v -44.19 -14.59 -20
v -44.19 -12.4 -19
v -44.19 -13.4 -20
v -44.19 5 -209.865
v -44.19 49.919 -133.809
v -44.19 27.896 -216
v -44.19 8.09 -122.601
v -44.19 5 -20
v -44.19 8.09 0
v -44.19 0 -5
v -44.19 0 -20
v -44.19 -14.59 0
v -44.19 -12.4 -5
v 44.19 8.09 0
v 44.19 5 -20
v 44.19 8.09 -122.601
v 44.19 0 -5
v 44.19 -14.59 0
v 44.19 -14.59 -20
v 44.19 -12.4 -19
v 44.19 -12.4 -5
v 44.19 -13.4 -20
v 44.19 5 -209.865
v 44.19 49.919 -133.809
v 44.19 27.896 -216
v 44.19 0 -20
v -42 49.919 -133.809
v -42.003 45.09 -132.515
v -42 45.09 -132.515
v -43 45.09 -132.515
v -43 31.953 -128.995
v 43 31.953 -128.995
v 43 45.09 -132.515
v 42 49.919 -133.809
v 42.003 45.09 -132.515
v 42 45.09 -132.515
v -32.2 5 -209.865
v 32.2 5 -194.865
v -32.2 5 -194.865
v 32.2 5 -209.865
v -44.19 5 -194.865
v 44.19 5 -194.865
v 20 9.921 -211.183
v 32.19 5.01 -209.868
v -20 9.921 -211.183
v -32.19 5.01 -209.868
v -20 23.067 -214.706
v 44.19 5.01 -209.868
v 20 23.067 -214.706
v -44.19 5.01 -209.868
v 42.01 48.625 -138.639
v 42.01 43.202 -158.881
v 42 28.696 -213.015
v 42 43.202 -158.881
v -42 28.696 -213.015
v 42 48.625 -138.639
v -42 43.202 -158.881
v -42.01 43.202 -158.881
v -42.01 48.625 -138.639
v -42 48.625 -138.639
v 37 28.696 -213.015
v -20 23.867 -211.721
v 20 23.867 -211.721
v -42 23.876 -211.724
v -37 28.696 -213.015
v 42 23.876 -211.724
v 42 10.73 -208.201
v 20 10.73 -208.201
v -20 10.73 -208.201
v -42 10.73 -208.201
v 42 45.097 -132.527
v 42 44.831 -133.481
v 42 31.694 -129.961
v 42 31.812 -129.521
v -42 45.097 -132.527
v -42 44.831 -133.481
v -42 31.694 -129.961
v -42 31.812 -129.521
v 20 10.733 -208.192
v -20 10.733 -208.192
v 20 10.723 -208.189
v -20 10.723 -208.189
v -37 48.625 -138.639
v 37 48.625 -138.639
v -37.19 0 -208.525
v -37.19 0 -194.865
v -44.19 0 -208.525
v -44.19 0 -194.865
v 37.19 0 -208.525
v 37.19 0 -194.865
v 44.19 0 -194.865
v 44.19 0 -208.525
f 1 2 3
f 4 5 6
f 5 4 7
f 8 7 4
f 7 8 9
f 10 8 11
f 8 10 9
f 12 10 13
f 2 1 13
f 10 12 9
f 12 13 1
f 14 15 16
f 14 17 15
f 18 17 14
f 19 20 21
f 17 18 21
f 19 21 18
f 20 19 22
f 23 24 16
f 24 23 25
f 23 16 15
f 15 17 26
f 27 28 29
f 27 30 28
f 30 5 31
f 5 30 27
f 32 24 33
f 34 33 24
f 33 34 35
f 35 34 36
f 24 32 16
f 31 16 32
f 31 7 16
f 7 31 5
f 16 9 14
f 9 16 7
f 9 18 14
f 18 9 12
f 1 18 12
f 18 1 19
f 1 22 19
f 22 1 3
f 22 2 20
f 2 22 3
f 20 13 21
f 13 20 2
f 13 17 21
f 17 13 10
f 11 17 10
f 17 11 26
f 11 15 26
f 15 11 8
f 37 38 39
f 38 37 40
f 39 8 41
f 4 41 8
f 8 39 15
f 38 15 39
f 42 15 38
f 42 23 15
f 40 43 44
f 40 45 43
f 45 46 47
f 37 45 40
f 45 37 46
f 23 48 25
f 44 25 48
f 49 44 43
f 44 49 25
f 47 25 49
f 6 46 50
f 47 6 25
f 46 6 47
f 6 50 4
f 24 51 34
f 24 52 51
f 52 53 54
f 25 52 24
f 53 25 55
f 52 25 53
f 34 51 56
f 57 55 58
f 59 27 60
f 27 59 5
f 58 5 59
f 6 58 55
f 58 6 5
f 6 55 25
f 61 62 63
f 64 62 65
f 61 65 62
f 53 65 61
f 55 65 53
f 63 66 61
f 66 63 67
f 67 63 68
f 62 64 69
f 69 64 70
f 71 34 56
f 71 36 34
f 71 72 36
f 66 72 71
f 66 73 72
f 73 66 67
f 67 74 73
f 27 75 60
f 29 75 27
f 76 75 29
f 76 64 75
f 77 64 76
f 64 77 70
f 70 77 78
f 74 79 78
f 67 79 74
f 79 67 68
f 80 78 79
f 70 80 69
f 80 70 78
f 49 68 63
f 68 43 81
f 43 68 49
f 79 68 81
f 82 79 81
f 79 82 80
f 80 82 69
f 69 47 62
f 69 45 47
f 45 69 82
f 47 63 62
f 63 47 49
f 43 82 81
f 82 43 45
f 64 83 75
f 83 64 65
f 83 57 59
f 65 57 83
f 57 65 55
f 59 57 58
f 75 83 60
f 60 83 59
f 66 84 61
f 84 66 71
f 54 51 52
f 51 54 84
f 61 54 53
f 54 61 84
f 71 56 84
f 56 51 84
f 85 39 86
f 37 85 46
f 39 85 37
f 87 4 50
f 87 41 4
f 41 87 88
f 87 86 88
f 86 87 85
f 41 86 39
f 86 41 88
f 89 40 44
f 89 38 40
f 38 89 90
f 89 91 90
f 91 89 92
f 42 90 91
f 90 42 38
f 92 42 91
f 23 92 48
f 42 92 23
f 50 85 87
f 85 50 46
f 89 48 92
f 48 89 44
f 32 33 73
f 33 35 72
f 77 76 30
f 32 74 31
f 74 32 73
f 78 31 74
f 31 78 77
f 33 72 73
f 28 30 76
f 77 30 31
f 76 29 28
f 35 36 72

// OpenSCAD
// file: BOSL2/std.scad
// Minimal BOSL2 compatibility shim for bundled gallery models.
// It implements only the helpers used by the imported OpenSCAD projects.

CENTER = [0, 0, 0];
BOTTOM = [0, 0, -1];
TOP = [0, 0, 1];
LEFT = [-1, 0, 0];
RIGHT = [1, 0, 0];
FRONT = [0, -1, 0];
BACK = [0, 1, 0];

module up(z=0) {
    translate([0, 0, z]) children();
}

module down(z=0) {
    translate([0, 0, -z]) children();
}

module attach(anchor=CENTER) {
    children();
}

module cuboid(size=[1, 1, 1], anchor=CENTER) {
    center = anchor == CENTER;
    translate(center ? [0, 0, 0] : [0, 0, size[2] / 2])
        cube(size, center=true);
    children();
}

module xcyl(h=1, r=1, anchor=CENTER) {
    center = anchor == CENTER;
    translate(center ? [0, 0, 0] : [h / 2, 0, 0])
        rotate([0, 90, 0])
            cylinder(h=h, r=r, center=true);
}
// main file
// phone-shower-holder.scad
//
// One piece. Hangs on the front face of a half-inch glass shower panel by a
// hook over the panel's top edge, and holds a phone by the two long edges of
// its bottom half, leaning the top of the phone out toward the viewer.
//
// Second design. The first was a full-length tray rebuilt from a SketchUp-era
// mesh: it stood the phone flat against the glass in a pocket with nothing in
// front to keep it there, and Ziad scrapped it on 2026-09-20 for this. Nothing
// here is measured off that mesh. Every number is authored, and the hook's are
// the ones the first design settled on.
//
// FRAME. Authored hung, the way it is used:
//
//     x  ->  across the panel, centered
//     y  ->  out from the glass toward the viewer. The glass's front face is
//            y = 0 and the glass itself is y < 0, so the hook's leg is the
//            only thing at negative y. Only the channel wall at the top and
//            the two feet at the bottom touch y = 0; the spine between them
//            stands `standoff` off the glass so water behind it runs out.
//     z  ->  up, with z = 0 at the top of the cap. Everything hangs below.
//
// The cradle is authored in its own frame, tilted `tilt` degrees about x, and
// placed with in_cradle(): x is shared, y' is out from the backrest (normal to
// the phone), z' runs up the phone's long axis from the ledge. Every cradle
// dimension is in that frame, so "front" means the phone's screen side and
// "top" means toward the phone's top, whatever those come to in hung z.
//
// PRINTING. On a side, one rail down; `orient = "print"` writes the STL that
// way, yawed 45 degrees so 216 mm fits the plate's diagonal inside the safe
// envelope. Every face is then vertical except the upper rail's 45 degree lip,
// the upper foot's 45 degree inner face, the top-end chamfers, and the ledge
// over the notch, which bridges 13.6 mm from the backrest to the front bar. No support. Standing it on the hook end,
// as the first design planned, is worse: the face the phone stands on would be
// an overhang 15 degrees off horizontal, and the part is over the 215 mm safe
// height that way.

include <BOSL2/std.scad>

/* [Which output] */
// "fitcheck" adds the glass in the hook and the phone in the cradle. Not for
// printing - it is the view that proves the tilt and the clearances.
show   = "part";  // [part, fitcheck]
// "print" lies the part on its -x side, yawed 45 degrees, so it lands on the
// plate the way it should be sliced. Same geometry.
orient = "hung";  // [hung, print]

/* [Phone] */
// A 16 Pro Max in its case, as Ziad measured it on 2026-09-20, "about".
// CALIPER BOTH BEFORE PRINTING: the rails are cut to these plus the slack
// below, and a case 1 mm wider than "about" will not go in.
phone_w = 83.0;   // width, in its case (mm)
phone_t = 13.0;   // thickness, in its case (mm)
phone_l = 166.0;  // length, in its case; fitcheck only (mm)
// Free clearance on a 0.4 nozzle is 0.30 per the ladder in
// docs/flashforge-ad5m-pro-scad-reference.md; opened because the phone goes in
// and out wet, one-handed.
phone_fit_w = 1.0;  // total slack across the width (mm)
phone_fit_t = 0.6;  // slack between the backrest and the root of the lips (mm)

/* [Hang] */
tilt        = 15;     // deg; the top of the phone leans out toward the viewer
overall_len = 216.0;  // top of the cap to the lowest point of the cradle (mm)

/* [Hook - over the glass] */
glass_t   = 12.0;  // panel thickness, calipered 2026-09-20 (mm)
glass_fit = 0.40;  // total slack across the channel; it goes on and off wet (mm)
// Both faces exposed, so the rungs are 0.84, 1.29, 1.74, 2.19, 2.64, 3.09.
leg_t     = 2.19;  // the leg that drops behind the glass (mm)
cap_t     = 5.0;   // material over the glass's top edge (mm)
wrap      = 15.0;  // how far the leg reaches down the back face (mm)
// 45 deg, eating into the leg; held to 1.0 so the flat left on the leg's end
// stays over the 0.84 floor for a load-bearing feature.
lead_in   = 1.0;   // guide at the channel's mouth (mm)

/* [Spine] */
// The plate down the glass from the hook to the cradle. It carries the
// cradle's whole moment.
spine_t = 3.09;  // (mm)
// The spine does not lie on the glass. It bears at the top through the
// channel's front wall and at the bottom through two feet, and between them
// it stands off by this much, so the gap behind it is open along both sides
// and across the bottom and water runs out instead of sitting there. The
// first design lay flat on the glass and drained through slots, which was
// not enough.
standoff = 5.0;   // spine's back face to the glass (mm)
foot_w   = 12.0;  // each foot, in from the part's side face (mm)
foot_h   = 15.0;  // each foot, up from the bottom (mm)

/* [Cradle] */
cradle_len = 82.0;  // how much of the phone's edge is held, up from its bottom (mm)
wall       = 2.19;  // the rail walls, outside the phone's edges (mm)
// The lip is a 45 degree bevel, not a flat tab, so that it prints with the
// part on its side: the upper rail's lip hangs from its wall and 45 is the
// steepest it can hang. Its reach is measured at the front face; at the level
// of the phone's own face the bevel is just leaving the wall.
lip_r      = 5.0;   // reach of each lip, inward from its wall (mm)
ledge_t    = 3.09;  // the shelf the phone's bottom edge stands on (mm)
back_min   = 2.64;  // backrest thickness at the ledge, where the wedge is thinnest (mm)
notch_w    = 40.0;  // gap in the ledge for the lanyard, centered (mm)
// Chamfer on the rails' inner edges at the top end, where the phone goes in.
// Small, because the walls are only 2.19.
flare      = 1.0;   // (mm)

/* [Quality] */
$fn = 64;  // nothing here is round, but the template wants it set

// Small overshoot used on every subtracted solid so its faces are never
// coplanar with the parent's.
eps = 0.01;

// Long enough to pass through anything here.
tall = 300;

// ---------------------------------------------------------------- derived

gch   = glass_t + glass_fit;          // the channel the glass sits in
ch_w  = phone_w + phone_fit_w;        // between the rail walls
W     = ch_w + 2 * wall;              // the part's width
h_ch  = phone_t + phone_fit_t;        // backrest to the root of the lips
front = h_ch + lip_r;                 // backrest to the cradle's front face

s = sin(tilt);
c = cos(tilt);

// Cradle origin: the phone's bottom-back corner. In front of the spine by the
// thinnest the backrest gets, and as far down as puts the lowest point of the
// cradle - the front-bottom corner of the ledge - at overall_len.
spine_back  = standoff;
spine_front = standoff + spine_t;
y0 = spine_front + back_min;
z0 = -overall_len + front * s + ledge_t * c;

// Cradle frame to hung frame. Same map as in_cradle().
function H(yp, zp) = [y0 + yp * c + zp * s, z0 - yp * s + zp * c];

// Where the cradle's top plane runs back into the spine's front face, and
// where its bottom plane runs back to the spine's back face.
yp_top = (spine_front - y0 - cradle_len * s) / c;
yp_bot = (spine_back - y0 + ledge_t * s) / c;
z_foot = H(yp_bot, -ledge_t).y;  // the lowest point of the spine's back face

y_min = -(gch + leg_t);
y_max = H(front, cradle_len).x;

module in_cradle() {
    translate([0, y0, z0])
        rotate([-tilt, 0, 0])
            children();
}

// ---------------------------------------------------------------- body

// The whole side silhouette - hook, spine, wedge, and the cradle's box - as
// one polygon in (y, z). Everything that is not full width is cut out of the
// sweep of this or added to it afterward. Top level rather than inside body()
// because oriented() reads it too, to center the print pose on the plate.
silhouette = [
    [y_min,       0],                    // leg outer face, top
    [spine_front, 0],                    // cap front, top
    H(yp_top, cradle_len),               // the wedge's top meets the spine
    H(front,  cradle_len),               // cradle front, top
    H(front, -ledge_t),                  // cradle front, bottom: the lowest point
    H(yp_bot, -ledge_t),                 // the bottom runs back to the spine
    [spine_back, -cap_t - wrap],         // up the spine's back face, standing off
    [0,          -cap_t - wrap],         // out to the glass: the channel wall's foot
    [0,    -cap_t],                      // up the glass face to the cap
    [-gch, -cap_t],                      // across the channel's closed end
    [-gch, -cap_t - wrap + lead_in],     // down the leg's inner face
    [-gch - lead_in, -cap_t - wrap],     // the lead-in
    [y_min, -cap_t - wrap],              // leg outer face, bottom
];

module body() {
    rotate([90, 0, 90])
        linear_extrude(height = W, center = true, convexity = 6)
            polygon(silhouette);
}

// What the phone sits in: open at the front and at the top, floored by the
// ledge, backed by the wedge.
module pocket() {
    in_cradle()
        translate([-ch_w / 2, 0, 0])
            cube([ch_w, tall, tall]);
}

// Through the ledge, from the backrest forward to the phone's face, so the
// lanyard can hang straight down out of the case. It stops short of the
// front bar under the lips, which is what the ledge bridges from when the
// part prints on its side.
module notch() {
    in_cradle()
        translate([-notch_w / 2, -eps, -ledge_t - eps])
            cube([notch_w, h_ch + eps, ledge_t + 2 * eps]);
}

// One 45 degree bevel per rail, root on the wall, running the length of the
// cradle, with its top end cut back at 45 degrees so a phone coming down from
// above is steered in behind it rather than stopped on it.
module lips() {
    for (side = [-1, 1])
        in_cradle()
            difference() {
                linear_extrude(height = cradle_len)
                    polygon([
                        [side * (ch_w / 2 + eps), h_ch],
                        [side * (ch_w / 2 + eps), front],
                        [side * (ch_w / 2 - lip_r), front],
                    ]);

                translate([0, h_ch, cradle_len])
                    rotate([-45, 0, 0])
                        translate([-W, 0, 0])
                            cube([2 * W, tall, tall]);
            }
}

// Chamfer on the walls' inner edges at the top end. Confined to the depth
// behind the lips so it never undercuts a lip's root.
module flare_cut() {
    in_cradle()
        hull() {
            translate([-ch_w / 2, 0, cradle_len - flare])
                cube([ch_w, h_ch, eps]);

            translate([-ch_w / 2 - flare, 0, cradle_len])
                cube([ch_w + 2 * flare, h_ch, tall]);
        }
}

// Two feet at the bottom corners of the spine's back face, out to the glass.
// The inner face of each is a 45 degree slope, because in the print pose the
// upper foot hangs off the spine with nothing under it. Trimmed to the same
// plane as the rest of the bottom.
module feet() {
    intersection() {
        for (side = [-1, 1])
            translate([0, 0, z_foot - standoff])
                linear_extrude(height = foot_h + standoff)
                    polygon([
                        [side * W / 2, 0],
                        [side * W / 2, spine_back + eps],
                        [side * (W / 2 - foot_w), spine_back + eps],
                        [side * (W / 2 - foot_w + standoff), 0],
                    ]);

        in_cradle()
            translate([-W, -tall, -ledge_t])
                cube([2 * W, 2 * tall, tall]);
    }
}

module phone_holder() {
    difference() {
        union() {
            difference() {
                body();
                pocket();
                notch();
            }

            lips();
            feet();
        }

        flare_cut();
    }
}

// ---------------------------------------------------------------- output

// Hung, or lying on its -x side yawed 45 degrees. The yaw is what fits 216 mm
// inside the 205 mm safe envelope, and the part is centered after it: the
// silhouette is no rectangle, so the centre of the yawed footprint is not the
// centre of the hung one.
print_yaw = 45;
// Each silhouette vertex after the lay-down and the yaw: hung z runs along
// print -x, hung y along print y.
print_foot = [for (p = silhouette)
    let (px = -p.y, py = p.x)
        [px * cos(print_yaw) - py * sin(print_yaw),
         px * sin(print_yaw) + py * cos(print_yaw)]];
print_xs = [for (p = print_foot) p.x];
print_ys = [for (p = print_foot) p.y];

module oriented() {
    if (orient == "print")
        translate([-(min(print_xs) + max(print_xs)) / 2,
                   -(min(print_ys) + max(print_ys)) / 2,
                   W / 2])
            rotate([0, 0, print_yaw])
                rotate([0, -90, 0])
                    children();
    else
        children();
}

oriented() {
    phone_holder();

    if (show == "fitcheck") {
        // The panel, centered in the channel, its top edge on the cap.
        color("PaleTurquoise", 0.35)
            translate([-W / 2 - 20, -gch + glass_fit / 2, -cap_t - 230])
                cube([W + 40, glass_t, 230]);

        // The phone, on the ledge, centered in the slack.
        color("DimGray", 0.5)
            in_cradle()
                translate([-phone_w / 2, phone_fit_t / 2, 0])
                    cube([phone_w, phone_t, phone_l]);
    }
}
